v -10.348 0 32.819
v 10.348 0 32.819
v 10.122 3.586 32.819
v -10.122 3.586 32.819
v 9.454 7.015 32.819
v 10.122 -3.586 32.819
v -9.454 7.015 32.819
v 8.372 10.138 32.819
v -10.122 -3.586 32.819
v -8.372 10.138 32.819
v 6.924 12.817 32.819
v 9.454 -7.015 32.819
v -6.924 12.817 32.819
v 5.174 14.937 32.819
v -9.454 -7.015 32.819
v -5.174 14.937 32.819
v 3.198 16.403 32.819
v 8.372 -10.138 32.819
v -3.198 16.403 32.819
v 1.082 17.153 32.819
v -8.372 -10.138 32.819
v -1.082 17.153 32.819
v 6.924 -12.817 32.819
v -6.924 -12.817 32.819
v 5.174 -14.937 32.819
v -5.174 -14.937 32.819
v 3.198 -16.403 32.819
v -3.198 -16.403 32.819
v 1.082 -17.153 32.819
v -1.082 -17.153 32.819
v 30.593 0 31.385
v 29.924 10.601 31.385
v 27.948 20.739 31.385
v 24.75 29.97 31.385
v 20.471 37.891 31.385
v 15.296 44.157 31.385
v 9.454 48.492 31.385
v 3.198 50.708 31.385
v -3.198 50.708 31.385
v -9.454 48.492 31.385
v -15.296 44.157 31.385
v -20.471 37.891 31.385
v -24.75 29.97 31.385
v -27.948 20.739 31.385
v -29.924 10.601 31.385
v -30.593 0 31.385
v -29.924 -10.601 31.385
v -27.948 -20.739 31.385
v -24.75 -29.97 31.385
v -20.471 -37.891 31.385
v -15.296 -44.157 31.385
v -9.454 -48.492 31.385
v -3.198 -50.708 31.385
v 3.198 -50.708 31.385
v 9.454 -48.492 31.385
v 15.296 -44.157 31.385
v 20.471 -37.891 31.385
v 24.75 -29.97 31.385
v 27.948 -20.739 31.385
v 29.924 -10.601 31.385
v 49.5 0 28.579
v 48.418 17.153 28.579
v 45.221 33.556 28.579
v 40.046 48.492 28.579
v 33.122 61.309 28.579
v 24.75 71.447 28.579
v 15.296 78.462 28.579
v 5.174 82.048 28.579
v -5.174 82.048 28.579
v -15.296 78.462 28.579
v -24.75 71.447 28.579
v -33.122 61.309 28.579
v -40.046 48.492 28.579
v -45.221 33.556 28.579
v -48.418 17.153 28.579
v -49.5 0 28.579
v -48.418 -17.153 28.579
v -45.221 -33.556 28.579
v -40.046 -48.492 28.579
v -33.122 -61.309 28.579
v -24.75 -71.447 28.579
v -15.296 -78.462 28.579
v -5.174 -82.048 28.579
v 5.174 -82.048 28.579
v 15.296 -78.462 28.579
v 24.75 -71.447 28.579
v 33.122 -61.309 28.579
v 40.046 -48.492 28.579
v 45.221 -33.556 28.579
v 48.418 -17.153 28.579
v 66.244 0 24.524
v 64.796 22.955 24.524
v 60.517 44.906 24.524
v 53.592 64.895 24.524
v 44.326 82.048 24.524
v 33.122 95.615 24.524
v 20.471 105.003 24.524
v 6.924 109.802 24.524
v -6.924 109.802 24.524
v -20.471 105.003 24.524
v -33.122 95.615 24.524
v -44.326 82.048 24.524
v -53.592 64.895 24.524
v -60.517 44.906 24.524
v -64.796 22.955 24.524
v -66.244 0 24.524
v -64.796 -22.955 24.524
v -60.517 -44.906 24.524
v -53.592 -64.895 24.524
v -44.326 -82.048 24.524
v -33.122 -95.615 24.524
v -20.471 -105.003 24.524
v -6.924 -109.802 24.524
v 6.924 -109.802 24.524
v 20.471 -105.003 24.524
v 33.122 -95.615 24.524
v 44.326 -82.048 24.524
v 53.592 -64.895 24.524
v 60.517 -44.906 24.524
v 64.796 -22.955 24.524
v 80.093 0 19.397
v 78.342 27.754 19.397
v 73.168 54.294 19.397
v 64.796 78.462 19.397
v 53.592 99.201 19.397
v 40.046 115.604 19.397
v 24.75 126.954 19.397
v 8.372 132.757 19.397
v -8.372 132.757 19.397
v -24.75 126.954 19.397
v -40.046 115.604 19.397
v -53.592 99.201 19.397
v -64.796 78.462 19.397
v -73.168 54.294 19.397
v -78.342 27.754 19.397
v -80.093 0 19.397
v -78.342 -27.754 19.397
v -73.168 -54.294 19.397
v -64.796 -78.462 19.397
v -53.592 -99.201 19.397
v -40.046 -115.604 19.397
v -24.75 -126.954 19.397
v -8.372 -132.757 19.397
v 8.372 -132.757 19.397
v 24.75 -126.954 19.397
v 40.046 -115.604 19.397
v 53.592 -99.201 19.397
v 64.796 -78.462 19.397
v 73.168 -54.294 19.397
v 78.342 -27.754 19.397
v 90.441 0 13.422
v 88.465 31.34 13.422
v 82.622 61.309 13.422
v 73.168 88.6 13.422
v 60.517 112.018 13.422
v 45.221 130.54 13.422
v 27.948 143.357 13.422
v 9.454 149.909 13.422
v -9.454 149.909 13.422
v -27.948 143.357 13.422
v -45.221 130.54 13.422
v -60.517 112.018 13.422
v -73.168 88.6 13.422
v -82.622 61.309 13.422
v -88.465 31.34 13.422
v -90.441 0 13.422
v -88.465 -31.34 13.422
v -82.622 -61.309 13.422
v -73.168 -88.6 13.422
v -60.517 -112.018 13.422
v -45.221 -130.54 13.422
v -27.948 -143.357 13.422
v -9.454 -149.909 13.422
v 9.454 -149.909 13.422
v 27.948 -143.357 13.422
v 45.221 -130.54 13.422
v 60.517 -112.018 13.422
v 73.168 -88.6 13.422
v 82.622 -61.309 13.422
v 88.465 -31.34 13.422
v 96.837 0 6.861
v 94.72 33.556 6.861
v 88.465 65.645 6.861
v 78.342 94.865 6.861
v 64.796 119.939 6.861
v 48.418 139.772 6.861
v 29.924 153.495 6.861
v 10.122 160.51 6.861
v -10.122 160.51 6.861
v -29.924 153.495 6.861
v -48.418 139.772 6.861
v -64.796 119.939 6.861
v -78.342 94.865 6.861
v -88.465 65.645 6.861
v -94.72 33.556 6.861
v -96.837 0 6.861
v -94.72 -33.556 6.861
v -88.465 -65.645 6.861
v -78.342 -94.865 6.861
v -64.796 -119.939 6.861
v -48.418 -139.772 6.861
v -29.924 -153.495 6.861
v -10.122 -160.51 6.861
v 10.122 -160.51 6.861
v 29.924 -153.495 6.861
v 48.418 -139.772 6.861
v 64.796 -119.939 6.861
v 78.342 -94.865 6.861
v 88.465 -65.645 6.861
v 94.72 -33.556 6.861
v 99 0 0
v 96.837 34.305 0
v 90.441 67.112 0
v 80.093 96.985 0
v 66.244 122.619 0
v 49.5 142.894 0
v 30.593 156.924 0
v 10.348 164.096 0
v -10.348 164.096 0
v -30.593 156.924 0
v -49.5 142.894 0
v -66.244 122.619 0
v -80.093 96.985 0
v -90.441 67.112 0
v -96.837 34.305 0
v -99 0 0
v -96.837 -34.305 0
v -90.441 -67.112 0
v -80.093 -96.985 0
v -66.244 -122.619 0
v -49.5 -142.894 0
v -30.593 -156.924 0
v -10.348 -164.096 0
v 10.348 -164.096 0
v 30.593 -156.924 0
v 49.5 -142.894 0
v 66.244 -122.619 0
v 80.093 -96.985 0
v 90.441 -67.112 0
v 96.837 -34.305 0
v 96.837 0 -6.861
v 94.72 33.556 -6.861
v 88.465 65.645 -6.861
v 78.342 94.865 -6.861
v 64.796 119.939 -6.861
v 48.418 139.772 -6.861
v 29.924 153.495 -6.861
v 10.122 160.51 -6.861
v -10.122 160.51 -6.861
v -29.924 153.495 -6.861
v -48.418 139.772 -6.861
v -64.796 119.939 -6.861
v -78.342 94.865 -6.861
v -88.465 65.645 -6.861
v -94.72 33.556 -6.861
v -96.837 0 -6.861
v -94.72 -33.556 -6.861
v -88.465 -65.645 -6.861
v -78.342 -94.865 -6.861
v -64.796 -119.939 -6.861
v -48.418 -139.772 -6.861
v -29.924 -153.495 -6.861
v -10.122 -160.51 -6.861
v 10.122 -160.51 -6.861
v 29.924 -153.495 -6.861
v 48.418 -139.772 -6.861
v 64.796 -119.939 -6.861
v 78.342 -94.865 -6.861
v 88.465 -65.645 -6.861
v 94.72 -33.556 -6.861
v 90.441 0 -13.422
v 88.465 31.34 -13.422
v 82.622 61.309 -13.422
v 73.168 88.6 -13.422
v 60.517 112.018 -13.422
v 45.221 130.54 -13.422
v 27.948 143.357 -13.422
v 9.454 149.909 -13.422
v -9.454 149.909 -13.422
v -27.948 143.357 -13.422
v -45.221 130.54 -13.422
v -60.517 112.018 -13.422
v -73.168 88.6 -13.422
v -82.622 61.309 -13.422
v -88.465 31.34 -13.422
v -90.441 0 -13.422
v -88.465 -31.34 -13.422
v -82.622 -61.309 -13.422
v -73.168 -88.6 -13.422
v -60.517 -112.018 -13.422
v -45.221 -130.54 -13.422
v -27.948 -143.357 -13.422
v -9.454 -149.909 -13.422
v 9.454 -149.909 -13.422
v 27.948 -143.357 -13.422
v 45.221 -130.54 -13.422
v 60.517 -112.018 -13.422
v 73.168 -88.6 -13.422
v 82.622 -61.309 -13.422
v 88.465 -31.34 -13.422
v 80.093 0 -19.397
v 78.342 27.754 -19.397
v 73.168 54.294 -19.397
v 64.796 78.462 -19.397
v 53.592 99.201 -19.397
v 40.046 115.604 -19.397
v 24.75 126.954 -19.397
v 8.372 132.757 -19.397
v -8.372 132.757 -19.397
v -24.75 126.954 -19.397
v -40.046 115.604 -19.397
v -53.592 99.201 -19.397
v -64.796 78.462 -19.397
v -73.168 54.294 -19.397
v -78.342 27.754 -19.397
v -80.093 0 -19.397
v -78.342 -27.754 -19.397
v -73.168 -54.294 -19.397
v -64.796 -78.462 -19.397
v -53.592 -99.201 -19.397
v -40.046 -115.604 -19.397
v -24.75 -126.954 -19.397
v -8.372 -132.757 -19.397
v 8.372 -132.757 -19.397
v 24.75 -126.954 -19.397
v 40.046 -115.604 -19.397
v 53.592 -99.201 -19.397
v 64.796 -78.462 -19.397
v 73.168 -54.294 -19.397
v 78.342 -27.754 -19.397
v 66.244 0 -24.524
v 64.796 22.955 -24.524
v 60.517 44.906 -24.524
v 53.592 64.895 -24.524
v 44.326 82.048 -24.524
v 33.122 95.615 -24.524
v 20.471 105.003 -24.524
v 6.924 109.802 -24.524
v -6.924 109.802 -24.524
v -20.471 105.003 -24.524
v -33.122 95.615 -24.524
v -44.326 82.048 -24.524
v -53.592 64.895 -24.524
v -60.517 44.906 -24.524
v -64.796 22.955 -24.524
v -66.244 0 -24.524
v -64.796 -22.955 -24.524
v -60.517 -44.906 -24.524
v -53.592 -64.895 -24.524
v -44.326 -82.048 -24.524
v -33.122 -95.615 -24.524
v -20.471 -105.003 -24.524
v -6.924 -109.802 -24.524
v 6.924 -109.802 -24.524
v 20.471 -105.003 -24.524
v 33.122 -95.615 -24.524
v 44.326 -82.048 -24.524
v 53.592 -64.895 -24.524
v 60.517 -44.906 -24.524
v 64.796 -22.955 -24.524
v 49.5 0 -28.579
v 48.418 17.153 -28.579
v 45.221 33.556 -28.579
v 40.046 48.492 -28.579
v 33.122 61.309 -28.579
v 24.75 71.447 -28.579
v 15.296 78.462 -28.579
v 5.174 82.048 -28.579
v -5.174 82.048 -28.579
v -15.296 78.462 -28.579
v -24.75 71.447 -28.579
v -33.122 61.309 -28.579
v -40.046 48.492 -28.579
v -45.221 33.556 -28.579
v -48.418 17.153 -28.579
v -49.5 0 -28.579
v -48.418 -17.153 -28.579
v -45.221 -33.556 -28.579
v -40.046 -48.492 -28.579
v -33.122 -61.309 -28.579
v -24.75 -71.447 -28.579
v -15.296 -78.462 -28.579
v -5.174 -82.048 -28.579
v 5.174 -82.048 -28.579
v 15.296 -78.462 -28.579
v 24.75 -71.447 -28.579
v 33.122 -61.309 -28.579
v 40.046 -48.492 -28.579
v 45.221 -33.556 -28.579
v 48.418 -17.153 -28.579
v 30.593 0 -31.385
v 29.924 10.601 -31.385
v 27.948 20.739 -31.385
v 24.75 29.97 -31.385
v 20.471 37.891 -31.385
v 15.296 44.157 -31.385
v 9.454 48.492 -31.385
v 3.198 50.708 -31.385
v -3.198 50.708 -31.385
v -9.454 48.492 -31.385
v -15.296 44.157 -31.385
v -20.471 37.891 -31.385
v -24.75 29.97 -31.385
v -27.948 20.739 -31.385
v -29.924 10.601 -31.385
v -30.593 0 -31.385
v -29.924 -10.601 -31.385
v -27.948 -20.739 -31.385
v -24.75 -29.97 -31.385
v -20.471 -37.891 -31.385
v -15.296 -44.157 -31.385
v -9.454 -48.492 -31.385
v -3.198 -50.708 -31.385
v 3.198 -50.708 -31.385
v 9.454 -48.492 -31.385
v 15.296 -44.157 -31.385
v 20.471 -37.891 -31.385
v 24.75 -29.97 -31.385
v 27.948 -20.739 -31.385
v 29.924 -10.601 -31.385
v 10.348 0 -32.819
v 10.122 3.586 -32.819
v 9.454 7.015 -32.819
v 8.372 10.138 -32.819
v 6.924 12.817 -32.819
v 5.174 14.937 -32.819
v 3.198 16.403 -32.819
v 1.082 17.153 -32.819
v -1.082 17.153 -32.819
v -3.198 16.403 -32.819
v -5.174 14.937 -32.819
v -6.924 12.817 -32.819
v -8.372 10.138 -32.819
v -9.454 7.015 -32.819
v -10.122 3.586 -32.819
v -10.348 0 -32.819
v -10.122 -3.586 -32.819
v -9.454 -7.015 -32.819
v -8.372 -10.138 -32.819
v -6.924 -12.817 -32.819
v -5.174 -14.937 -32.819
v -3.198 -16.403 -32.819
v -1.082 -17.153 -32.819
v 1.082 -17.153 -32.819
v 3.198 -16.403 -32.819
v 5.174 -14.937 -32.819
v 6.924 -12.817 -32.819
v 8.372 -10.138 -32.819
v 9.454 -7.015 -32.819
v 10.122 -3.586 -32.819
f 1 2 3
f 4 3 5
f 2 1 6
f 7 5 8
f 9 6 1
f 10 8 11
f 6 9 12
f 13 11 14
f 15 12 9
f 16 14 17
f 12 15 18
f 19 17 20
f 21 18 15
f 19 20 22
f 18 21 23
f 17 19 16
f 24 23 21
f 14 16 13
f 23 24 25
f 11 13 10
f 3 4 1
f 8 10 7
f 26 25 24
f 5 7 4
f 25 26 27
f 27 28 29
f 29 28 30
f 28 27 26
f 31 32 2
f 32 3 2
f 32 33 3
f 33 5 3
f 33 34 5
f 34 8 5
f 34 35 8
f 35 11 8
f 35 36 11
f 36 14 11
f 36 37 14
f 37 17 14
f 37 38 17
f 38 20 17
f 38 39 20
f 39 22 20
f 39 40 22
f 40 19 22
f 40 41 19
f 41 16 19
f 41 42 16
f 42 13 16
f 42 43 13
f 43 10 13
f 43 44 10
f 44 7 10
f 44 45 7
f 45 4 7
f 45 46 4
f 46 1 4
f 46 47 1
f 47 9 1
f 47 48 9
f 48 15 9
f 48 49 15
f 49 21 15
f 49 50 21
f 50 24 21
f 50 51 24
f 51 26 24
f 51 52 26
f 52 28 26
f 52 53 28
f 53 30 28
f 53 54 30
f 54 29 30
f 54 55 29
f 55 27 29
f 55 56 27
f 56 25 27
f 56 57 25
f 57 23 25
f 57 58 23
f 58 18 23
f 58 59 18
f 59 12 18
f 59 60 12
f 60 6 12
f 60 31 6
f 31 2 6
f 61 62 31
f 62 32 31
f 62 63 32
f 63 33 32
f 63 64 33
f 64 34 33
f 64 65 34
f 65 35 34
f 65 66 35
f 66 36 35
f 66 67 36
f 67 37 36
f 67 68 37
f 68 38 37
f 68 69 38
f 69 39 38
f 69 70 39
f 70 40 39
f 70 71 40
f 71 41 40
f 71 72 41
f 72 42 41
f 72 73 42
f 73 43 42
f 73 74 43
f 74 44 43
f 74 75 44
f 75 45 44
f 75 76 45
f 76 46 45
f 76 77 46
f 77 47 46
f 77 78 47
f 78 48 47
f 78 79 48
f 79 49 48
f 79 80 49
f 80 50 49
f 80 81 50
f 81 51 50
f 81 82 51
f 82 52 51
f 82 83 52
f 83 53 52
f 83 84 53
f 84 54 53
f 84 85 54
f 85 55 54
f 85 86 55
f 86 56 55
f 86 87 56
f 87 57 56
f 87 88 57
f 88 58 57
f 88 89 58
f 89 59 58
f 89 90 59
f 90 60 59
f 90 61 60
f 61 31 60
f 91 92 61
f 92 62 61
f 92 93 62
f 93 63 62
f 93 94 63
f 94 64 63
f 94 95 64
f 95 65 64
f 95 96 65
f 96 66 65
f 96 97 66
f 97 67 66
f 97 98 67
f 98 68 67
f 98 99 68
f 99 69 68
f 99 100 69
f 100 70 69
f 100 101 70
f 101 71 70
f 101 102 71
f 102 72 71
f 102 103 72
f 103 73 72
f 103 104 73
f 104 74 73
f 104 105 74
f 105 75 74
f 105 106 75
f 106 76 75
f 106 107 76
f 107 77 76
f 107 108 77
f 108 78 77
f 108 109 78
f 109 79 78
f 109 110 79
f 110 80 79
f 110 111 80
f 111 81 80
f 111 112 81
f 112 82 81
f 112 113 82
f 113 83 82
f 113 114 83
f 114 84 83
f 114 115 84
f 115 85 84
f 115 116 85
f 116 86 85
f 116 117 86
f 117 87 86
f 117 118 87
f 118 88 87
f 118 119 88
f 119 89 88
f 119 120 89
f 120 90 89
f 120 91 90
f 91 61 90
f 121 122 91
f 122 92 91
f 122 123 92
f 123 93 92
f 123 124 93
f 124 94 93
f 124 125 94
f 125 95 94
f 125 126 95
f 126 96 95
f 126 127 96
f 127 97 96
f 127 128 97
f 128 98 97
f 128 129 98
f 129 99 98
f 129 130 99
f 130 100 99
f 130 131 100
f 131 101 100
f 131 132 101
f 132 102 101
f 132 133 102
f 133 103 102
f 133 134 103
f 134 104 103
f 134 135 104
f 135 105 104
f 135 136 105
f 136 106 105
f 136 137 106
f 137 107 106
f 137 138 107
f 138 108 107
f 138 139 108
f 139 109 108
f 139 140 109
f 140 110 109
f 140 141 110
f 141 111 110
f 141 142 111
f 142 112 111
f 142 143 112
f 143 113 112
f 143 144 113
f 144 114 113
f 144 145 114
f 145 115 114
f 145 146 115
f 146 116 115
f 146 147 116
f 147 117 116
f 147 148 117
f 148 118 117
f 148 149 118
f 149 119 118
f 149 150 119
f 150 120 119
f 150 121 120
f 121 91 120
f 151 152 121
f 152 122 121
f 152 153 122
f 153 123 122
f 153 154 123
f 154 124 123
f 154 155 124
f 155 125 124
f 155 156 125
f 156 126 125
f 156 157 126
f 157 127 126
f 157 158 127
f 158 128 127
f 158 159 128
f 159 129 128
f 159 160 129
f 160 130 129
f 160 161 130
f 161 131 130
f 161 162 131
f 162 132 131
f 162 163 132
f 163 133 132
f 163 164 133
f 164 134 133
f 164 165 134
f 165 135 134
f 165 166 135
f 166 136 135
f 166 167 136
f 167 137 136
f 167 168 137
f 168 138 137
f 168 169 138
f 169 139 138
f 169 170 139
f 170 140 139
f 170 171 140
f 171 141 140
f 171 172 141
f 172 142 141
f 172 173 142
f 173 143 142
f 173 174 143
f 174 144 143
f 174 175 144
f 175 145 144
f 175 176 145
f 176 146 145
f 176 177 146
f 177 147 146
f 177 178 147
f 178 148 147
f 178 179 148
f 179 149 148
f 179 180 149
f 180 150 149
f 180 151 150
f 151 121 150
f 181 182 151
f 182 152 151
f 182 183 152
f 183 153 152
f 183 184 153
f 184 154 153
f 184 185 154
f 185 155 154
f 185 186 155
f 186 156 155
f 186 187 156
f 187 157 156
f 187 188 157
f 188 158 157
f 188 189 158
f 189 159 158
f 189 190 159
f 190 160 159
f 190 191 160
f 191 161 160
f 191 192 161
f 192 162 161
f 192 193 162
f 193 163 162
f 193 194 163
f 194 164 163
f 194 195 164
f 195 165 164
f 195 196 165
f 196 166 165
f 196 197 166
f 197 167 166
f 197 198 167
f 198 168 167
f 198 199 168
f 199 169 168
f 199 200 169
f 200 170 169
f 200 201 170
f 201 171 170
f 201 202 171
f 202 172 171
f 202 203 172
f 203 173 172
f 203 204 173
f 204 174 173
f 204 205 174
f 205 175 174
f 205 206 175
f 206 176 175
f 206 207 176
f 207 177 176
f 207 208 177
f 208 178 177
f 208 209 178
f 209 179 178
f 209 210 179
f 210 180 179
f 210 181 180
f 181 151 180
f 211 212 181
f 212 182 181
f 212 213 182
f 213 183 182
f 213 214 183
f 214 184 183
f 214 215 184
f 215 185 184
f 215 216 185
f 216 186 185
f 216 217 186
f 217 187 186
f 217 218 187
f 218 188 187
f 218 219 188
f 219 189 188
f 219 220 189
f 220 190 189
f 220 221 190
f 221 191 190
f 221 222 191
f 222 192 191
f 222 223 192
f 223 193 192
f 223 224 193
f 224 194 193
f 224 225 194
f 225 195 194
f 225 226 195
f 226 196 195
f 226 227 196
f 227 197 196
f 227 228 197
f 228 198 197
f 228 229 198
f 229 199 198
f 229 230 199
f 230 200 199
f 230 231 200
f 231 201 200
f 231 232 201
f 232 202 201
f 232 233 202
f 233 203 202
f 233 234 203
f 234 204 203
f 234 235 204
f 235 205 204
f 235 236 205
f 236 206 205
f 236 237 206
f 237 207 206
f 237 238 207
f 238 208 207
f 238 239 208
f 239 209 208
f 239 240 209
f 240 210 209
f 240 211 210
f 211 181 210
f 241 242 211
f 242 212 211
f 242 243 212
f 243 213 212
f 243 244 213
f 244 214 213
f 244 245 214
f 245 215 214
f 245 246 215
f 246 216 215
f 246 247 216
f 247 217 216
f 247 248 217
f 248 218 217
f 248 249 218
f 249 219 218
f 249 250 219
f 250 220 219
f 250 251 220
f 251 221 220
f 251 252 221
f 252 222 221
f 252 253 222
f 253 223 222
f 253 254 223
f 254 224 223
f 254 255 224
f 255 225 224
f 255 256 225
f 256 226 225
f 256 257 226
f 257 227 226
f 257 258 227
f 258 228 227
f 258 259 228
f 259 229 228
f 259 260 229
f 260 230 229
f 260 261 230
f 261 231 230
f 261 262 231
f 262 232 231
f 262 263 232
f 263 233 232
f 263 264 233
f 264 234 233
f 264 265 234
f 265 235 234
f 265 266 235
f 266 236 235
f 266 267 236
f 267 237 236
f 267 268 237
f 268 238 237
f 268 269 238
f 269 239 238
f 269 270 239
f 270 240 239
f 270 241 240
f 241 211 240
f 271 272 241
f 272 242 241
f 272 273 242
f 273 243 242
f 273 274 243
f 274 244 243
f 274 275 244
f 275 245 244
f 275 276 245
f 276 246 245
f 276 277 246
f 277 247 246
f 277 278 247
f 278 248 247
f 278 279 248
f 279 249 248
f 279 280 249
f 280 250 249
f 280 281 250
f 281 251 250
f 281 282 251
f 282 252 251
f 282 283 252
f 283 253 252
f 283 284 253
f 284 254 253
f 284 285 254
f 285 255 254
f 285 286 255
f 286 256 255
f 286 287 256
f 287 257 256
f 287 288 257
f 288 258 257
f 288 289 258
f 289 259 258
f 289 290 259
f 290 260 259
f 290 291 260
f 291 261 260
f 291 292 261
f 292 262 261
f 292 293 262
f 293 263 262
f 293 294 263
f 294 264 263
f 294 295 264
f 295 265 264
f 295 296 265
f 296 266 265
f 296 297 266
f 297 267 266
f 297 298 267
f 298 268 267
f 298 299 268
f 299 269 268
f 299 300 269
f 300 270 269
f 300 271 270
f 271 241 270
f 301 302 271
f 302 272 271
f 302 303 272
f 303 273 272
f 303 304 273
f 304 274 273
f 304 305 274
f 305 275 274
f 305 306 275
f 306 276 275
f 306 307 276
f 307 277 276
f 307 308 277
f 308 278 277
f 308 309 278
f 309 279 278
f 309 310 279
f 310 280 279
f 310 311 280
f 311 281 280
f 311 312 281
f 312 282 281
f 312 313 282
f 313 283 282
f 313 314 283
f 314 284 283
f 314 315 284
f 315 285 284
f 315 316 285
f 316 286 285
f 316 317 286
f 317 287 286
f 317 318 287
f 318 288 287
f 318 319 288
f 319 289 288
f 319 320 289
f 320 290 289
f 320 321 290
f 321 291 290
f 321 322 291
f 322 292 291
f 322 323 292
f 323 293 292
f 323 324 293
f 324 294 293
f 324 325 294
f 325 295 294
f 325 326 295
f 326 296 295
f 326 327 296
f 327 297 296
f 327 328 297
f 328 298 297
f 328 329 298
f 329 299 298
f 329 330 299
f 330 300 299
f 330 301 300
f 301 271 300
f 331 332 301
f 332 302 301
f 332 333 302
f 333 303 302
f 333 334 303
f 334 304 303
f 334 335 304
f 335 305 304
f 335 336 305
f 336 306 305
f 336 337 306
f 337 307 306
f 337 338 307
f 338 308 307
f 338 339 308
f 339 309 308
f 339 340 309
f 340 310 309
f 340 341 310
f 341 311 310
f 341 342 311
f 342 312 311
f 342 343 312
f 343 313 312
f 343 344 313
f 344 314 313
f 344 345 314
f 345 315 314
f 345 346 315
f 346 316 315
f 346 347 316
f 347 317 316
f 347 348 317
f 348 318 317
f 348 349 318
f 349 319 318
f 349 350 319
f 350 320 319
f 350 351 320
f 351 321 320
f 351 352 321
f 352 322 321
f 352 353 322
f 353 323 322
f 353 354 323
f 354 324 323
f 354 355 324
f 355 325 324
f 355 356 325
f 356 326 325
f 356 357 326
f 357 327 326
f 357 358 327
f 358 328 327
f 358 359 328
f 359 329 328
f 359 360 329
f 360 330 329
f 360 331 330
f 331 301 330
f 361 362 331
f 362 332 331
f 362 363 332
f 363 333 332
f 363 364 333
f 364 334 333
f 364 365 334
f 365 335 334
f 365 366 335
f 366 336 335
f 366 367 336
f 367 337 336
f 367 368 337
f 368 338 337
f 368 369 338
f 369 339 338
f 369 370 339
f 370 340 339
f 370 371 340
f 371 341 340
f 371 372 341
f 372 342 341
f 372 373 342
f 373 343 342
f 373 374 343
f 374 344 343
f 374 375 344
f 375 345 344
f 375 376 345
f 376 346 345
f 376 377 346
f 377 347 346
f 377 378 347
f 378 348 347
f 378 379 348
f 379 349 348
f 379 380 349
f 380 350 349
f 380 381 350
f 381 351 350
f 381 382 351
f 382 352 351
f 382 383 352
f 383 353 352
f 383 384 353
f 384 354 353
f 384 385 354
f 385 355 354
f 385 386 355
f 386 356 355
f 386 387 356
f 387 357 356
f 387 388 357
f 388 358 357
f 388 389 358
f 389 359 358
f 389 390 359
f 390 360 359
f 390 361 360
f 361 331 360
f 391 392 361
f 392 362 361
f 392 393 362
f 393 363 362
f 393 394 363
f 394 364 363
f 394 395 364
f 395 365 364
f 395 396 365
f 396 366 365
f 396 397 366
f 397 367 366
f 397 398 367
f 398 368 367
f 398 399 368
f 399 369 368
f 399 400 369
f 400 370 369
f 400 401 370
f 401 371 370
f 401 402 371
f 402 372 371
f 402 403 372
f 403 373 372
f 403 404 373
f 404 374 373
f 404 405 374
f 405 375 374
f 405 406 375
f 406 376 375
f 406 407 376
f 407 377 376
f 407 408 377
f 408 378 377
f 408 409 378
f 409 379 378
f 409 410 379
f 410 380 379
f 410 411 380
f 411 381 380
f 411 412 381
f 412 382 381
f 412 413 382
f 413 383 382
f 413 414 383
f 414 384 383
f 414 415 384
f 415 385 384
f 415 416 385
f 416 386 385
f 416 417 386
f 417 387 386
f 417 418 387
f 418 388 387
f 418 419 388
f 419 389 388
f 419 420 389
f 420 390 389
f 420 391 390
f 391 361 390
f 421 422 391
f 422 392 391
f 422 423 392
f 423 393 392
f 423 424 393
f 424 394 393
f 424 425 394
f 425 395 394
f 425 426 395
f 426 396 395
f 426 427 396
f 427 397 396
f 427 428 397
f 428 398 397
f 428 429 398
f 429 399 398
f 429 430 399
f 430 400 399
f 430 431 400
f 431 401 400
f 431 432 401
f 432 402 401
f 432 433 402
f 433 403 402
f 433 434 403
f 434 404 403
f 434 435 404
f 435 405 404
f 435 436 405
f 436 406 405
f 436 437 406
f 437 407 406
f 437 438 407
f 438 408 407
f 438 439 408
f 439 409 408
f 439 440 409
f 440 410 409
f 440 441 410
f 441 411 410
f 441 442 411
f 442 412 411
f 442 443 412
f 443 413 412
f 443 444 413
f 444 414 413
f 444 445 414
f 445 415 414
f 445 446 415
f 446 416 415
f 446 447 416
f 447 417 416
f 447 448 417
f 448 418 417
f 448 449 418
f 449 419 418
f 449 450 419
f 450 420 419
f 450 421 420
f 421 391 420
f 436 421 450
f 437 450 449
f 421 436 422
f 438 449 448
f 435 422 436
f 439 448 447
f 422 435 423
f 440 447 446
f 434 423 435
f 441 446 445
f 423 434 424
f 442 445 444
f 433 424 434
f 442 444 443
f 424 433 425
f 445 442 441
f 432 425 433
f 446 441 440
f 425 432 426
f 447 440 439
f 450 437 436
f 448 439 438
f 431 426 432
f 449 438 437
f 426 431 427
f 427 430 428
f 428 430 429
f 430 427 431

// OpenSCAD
// Generated by SolidPython 1.0.1 on 2020-07-29 00:46:49


scale(v = [9, 15, 3]) {
	sphere(r = 11);
}
/***********************************************
*********      SolidPython code:      **********
************************************************
 
# import packages: SolidPython
from solid import *
from solid.utils import *
from itertools import chain, combinations, permutations


class Resize:

    def __init__(self, scad_file):
        self.scad_file = scad_file
        #self.scad_file = import_scad(scad_file)
        # cone/cylinder param:
        self.r1 = 0
        self.r2 = 0
        self.h = 0
        # rectangular prism param:
        self.w = 0
        self.l = 0
        # ellipse param:
        self.r = 0

    # import OpenScad code (file name corresponds to shape)


    # classify shape + parameters
    def assign(self, param1, param2, param3):
        if self.scad_file == 'cone.scad':
            self.r1 = param1
            self.r2 = param2
            self.h = param3
        elif self.scad_file == 'cylinder.scad':
            self.r1 = param1
            self.r2 = param2
            self.h = param3
        elif self.scad_file == 'rectangularPrism.scad':
            self.h = param1
            self.l = param2
            self.w = param3
        else:
            self.r = param1
            self.h = param2

    # resize parameters
    def iterate(self):
        x = range(3, 20, 2)
        i = 1
        if self.scad_file == 'cone.scad':
            tempList = list(permutations(x, 2))
            for temp in tempList:
                param1 = temp[0]
                param2 = temp[1]
                filepath = 'produced_scad_files/' + 'cone' + str(param1) + '_' + str(param2) + '_' + '.scad'
                scad_render_to_file(cylinder(h=param1, r1=param2, r2=0), filepath)

        elif self.scad_file == 'cylinder.scad':
            tempList = list(permutations(x, 3))
            for temp in tempList:
                param1 = temp[0]
                param2 = temp[1]
                filepath = 'produced_scad_files/' + 'cylinder' + str(param1) + '_' + str(param2) + '_' + '.scad'
                scad_render_to_file(cylinder(h=param1, r1=param2, r2=param2), filepath)

        elif self.scad_file == 'rectangularPrism.scad':
            tempList = list(permutations(x, 3))
            for temp in tempList:
                param1 = temp[0]
                param2 = temp[1]
                param3 = temp[2]
                filepath = 'produced_scad_files/' + 'rectangularPrism' + str(param1) + '_' + str(param2) + '_' + str(
                    param3) + '.scad'
                scad_render_to_file(cube(size=(param1, param2, param3)), filepath)

        elif self.scad_file == 'ellipse.scad':
            tempList = list(permutations(x, 4))
            for temp in tempList:
                param1 = temp[0]
                param2 = temp[1]
                param3 = temp[2]
                param4 = temp[3]
                filepath = 'produced_scad_files/' + 'ellipse' + str(param1) + '_' + str(param2) + '_' + str(param3) + '_' + str(param4) + '.scad'
                scad_render_to_file(scale([param1, param2, param3])(sphere(r=param4)), filepath)

    def render_to_scadfile(self):
        scad_render_to_file(scad, 'example.scad') 
 
************************************************/
